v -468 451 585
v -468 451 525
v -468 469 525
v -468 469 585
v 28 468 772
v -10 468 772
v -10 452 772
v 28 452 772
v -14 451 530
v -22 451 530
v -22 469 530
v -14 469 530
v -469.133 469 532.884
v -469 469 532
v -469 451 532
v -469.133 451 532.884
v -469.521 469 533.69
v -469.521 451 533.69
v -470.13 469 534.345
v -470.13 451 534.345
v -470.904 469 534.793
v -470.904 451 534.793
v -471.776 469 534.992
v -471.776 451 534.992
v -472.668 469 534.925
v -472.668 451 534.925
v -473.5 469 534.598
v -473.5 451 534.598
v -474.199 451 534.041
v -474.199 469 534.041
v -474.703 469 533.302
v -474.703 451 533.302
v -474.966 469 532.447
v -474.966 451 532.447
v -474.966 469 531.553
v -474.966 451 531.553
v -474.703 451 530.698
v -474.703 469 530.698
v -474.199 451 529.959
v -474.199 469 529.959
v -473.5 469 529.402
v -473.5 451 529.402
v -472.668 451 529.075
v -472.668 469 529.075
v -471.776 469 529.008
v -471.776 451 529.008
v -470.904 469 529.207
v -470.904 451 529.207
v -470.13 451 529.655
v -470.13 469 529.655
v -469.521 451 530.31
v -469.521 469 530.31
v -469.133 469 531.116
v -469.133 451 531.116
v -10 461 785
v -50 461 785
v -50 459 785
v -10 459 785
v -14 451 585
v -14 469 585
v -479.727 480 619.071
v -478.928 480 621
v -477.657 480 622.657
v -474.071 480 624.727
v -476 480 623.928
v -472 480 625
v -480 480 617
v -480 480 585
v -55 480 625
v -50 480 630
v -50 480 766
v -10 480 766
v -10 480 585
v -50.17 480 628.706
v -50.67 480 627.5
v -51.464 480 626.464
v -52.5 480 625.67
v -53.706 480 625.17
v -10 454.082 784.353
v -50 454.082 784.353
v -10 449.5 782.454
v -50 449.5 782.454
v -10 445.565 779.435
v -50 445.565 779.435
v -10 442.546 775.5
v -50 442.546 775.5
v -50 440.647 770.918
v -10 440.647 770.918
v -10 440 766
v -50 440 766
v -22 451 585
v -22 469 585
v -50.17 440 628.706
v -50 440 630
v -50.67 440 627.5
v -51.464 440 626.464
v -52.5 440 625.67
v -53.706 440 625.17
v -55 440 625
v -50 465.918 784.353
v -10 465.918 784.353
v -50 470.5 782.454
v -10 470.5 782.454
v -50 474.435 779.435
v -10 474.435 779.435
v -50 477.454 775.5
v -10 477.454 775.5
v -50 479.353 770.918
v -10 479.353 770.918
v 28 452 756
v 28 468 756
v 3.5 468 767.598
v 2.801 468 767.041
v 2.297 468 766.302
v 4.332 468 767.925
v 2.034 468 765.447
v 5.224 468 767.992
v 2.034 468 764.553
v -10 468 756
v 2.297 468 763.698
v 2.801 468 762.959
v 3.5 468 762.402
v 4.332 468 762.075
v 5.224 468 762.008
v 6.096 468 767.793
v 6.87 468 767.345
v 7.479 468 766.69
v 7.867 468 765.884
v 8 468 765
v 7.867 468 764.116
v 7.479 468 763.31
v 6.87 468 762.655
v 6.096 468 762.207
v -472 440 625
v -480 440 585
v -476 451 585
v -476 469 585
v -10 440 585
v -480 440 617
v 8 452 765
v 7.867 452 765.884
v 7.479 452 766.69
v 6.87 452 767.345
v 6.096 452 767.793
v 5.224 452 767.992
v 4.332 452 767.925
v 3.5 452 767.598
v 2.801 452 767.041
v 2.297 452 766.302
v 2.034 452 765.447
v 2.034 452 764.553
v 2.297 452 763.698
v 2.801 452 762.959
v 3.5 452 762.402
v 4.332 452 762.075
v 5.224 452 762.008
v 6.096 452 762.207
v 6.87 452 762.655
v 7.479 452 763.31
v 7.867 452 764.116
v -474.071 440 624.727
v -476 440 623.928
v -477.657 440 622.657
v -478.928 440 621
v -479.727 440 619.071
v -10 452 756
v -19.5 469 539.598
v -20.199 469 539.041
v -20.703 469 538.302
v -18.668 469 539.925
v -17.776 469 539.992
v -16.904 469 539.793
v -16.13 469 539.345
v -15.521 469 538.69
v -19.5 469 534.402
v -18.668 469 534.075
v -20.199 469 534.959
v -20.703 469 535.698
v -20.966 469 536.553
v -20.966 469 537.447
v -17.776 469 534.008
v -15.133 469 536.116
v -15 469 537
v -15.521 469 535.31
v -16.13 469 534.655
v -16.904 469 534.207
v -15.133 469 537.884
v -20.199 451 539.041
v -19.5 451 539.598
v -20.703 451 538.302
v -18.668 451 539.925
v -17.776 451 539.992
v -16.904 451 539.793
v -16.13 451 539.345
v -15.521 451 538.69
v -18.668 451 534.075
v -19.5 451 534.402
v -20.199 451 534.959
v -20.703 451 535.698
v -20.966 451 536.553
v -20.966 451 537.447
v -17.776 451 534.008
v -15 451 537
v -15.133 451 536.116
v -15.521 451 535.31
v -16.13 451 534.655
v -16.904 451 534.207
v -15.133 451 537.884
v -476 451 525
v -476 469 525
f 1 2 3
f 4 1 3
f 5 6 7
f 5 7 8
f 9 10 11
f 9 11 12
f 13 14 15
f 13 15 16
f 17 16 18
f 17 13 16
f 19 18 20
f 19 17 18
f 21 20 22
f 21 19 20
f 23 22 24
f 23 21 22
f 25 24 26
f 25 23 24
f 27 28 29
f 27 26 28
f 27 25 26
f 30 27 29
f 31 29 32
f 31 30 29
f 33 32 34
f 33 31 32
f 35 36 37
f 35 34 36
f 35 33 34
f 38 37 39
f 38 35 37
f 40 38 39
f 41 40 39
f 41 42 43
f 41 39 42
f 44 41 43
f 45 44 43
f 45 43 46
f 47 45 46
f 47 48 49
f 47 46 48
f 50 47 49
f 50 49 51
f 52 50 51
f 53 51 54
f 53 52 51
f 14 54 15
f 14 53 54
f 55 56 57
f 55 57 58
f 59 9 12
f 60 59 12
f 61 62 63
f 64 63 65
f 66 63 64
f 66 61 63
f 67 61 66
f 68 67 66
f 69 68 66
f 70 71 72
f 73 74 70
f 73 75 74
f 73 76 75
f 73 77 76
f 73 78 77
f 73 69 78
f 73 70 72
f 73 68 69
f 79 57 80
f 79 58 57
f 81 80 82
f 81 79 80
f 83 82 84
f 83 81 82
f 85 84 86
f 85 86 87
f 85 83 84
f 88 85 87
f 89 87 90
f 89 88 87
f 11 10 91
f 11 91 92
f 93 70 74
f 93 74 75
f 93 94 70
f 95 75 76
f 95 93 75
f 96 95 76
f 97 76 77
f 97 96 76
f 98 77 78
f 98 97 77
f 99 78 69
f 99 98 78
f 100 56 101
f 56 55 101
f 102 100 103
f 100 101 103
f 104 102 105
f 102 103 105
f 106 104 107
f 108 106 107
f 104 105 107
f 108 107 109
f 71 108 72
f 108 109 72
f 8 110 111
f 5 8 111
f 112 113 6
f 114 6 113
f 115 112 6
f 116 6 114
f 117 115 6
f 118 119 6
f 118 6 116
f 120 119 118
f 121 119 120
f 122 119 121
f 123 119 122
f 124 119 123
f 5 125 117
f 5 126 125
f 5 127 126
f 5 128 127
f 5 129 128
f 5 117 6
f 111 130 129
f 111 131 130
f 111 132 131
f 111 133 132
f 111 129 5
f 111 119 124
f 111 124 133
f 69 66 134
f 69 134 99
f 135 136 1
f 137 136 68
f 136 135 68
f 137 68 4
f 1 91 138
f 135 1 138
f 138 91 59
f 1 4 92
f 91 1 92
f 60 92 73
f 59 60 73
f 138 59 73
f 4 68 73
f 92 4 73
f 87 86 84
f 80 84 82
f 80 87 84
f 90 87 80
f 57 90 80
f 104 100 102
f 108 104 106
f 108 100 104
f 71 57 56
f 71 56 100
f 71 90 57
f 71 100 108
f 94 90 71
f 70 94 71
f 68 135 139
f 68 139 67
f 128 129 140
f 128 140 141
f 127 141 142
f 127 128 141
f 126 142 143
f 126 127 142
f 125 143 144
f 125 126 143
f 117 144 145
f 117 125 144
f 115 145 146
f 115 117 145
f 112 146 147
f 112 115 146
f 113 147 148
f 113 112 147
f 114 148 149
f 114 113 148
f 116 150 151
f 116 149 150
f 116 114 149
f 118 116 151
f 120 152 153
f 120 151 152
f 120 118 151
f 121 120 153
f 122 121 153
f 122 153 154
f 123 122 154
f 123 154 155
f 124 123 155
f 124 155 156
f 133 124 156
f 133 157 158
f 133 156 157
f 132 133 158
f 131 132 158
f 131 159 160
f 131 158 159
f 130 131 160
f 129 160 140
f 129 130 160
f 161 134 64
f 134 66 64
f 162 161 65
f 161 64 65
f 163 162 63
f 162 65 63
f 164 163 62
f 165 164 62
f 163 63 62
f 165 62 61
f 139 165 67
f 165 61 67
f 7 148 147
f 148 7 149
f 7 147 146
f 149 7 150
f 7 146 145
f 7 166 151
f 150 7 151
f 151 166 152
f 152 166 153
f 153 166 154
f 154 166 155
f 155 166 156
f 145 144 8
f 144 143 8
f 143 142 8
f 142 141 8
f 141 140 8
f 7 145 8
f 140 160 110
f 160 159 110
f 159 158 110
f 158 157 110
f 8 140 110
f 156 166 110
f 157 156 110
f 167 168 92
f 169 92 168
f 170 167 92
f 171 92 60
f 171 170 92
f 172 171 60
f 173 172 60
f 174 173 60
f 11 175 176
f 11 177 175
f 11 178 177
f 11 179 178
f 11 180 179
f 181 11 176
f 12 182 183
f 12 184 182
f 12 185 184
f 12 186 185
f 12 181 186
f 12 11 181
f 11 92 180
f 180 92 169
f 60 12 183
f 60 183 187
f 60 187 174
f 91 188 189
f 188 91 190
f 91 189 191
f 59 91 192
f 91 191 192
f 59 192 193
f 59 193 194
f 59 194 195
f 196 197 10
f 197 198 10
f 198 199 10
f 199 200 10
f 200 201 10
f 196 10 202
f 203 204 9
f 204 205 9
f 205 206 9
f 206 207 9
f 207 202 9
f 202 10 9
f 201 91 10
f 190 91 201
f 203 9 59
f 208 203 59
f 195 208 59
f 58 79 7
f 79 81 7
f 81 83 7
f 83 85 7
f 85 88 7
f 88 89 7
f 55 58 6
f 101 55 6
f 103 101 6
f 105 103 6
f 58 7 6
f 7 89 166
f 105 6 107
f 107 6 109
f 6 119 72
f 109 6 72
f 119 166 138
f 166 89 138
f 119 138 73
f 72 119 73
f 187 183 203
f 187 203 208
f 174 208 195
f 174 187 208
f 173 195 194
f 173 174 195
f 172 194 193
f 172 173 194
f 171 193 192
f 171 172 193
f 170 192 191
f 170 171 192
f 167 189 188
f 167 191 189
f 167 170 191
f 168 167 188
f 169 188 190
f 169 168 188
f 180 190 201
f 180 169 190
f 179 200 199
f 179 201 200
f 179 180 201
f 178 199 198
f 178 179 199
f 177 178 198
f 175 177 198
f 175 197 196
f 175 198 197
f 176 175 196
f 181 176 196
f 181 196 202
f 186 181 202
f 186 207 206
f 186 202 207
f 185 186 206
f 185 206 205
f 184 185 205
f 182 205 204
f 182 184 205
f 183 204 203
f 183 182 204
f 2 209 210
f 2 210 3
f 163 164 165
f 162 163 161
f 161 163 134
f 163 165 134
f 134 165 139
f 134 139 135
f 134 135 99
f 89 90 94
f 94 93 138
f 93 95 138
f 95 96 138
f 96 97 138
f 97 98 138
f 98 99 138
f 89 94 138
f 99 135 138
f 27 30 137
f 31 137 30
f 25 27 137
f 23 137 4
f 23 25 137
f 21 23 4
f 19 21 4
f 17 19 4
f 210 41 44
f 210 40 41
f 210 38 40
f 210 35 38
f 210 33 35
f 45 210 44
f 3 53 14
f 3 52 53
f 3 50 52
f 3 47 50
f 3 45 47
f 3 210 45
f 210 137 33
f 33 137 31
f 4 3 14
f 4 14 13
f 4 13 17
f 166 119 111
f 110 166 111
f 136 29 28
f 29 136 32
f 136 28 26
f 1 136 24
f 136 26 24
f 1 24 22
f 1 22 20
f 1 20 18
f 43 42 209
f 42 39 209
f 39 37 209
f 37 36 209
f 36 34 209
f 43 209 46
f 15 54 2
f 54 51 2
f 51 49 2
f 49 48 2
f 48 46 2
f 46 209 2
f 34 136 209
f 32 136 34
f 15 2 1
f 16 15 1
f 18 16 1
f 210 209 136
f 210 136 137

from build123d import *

# Parameters (mm, degrees)
CYLINDER178_R          = 3
CYLINDER178_DEPTH      = 60
CYLINDER178_ROLL_ANGLE = 90
BOX109_W               = 38
BOX109_H               = 16
BOX109_DEPTH           = 16
BOX107_W               = 40
BOX107_H               = 40
BOX107_DEPTH           = 200
CYLINDER180_R          = 3
CYLINDER180_DEPTH      = 60
CYLINDER180_ROLL_ANGLE = 90
BOX110_W               = 8
BOX110_H               = 18
BOX110_DEPTH           = 60
CYLINDER179_R          = 3
CYLINDER179_DEPTH      = 60
CYLINDER179_ROLL_ANGLE = 90
BOX105_W               = 8
BOX105_H               = 18
BOX105_DEPTH           = 60
BOX106_W               = 470
BOX106_H               = 40
BOX106_DEPTH           = 40
FILLET_R               = 19
FILLET001_R            = 5
FILLET002_R            = 8


with BuildPart() as cilindro102:
    # Cylinder178 → Cylinder178 (new body)
    with BuildSketch(Plane.XY):
        Circle(CYLINDER178_R)
    extrude(amount=CYLINDER178_DEPTH)


with BuildPart() as cilindro102_1:
    # Cylinder178 roll: moved
    add(cilindro102.part.rotate(Axis((0, 0, 0), (1, 0, 0)), CYLINDER178_ROLL_ANGLE))


with BuildPart() as cilindro102_2:
    # Cylinder178 placement: moved
    add(cilindro102_1.part.moved(Location((5, 37, 765))))


with BuildPart() as cubo075:
    # Box109 → Box109 (new body)
    with BuildSketch(Plane(origin=(-10, -8, 756), x_dir=(1, 0, 0), z_dir=(0, 0, 1))):
        with Locations((19, 8)):
            Rectangle(BOX109_W, BOX109_H)
    extrude(amount=BOX109_DEPTH)


with BuildPart() as cut001:
    # Box107 → Box107 (new body)
    with BuildSketch(Plane(origin=(-50, -20, 585), x_dir=(1, 0, 0), z_dir=(0, 0, 1))):
        with Locations((20, 20)):
            Rectangle(BOX107_W, BOX107_H)
    extrude(amount=BOX107_DEPTH)

    # Fusion054: union Cubo075
    add(cubo075.part)

    # Cut220: cut Cilindro102
    add(cilindro102_2.part, mode=Mode.SUBTRACT)


with BuildPart() as cilindro104:
    # Cylinder180 → Cylinder180 (new body)
    with BuildSketch(Plane.XY):
        Circle(CYLINDER180_R)
    extrude(amount=CYLINDER180_DEPTH)


with BuildPart() as cilindro104_1:
    # Cylinder180 roll: moved
    add(cilindro104.part.rotate(Axis((0, 0, 0), (1, 0, 0)), CYLINDER180_ROLL_ANGLE))


with BuildPart() as cilindro104_2:
    # Cylinder180 placement: moved
    add(cilindro104_1.part.moved(Location((-18, 30, 532))))


with BuildPart() as saliente001:
    # Box110 → Box110 (new body)
    with BuildSketch(Plane(origin=(-22, -9, 525), x_dir=(1, 0, 0), z_dir=(0, 0, 1))):
        with Locations((4, 9)):
            Rectangle(BOX110_W, BOX110_H)
    extrude(amount=BOX110_DEPTH)

    # Cut222: cut Cilindro104
    add(cilindro104_2.part, mode=Mode.SUBTRACT)


with BuildPart() as saliente001_1:
    # Cut222 placement: moved
    add(saliente001.part.moved(Location((-454, 0, 0))))


with BuildPart() as cilindro103:
    # Cylinder179 → Cylinder179 (new body)
    with BuildSketch(Plane.XY):
        Circle(CYLINDER179_R)
    extrude(amount=CYLINDER179_DEPTH)


with BuildPart() as cilindro103_1:
    # Cylinder179 roll: moved
    add(cilindro103.part.rotate(Axis((0, 0, 0), (1, 0, 0)), CYLINDER179_ROLL_ANGLE))


with BuildPart() as cilindro103_2:
    # Cylinder179 placement: moved
    add(cilindro103_1.part.moved(Location((-18, 30, 532))))


with BuildPart() as cut221:
    # Box105 → Box105 (new body)
    with BuildSketch(Plane(origin=(-22, -9, 525), x_dir=(1, 0, 0), z_dir=(0, 0, 1))):
        with Locations((4, 9)):
            Rectangle(BOX105_W, BOX105_H)
    extrude(amount=BOX105_DEPTH)

    # Cut221: cut Cilindro103
    add(cilindro103_2.part, mode=Mode.SUBTRACT)


with BuildPart() as cut221_1:
    # Cut221 placement: moved
    add(cut221.part.moved(Location((0, 0, 5))))


with BuildPart() as fillet002:
    # Box106 → Box106 (new body)
    with BuildSketch(Plane(origin=(-480, -20, 585), x_dir=(1, 0, 0), z_dir=(0, 0, 1))):
        with Locations((235, 20)):
            Rectangle(BOX106_W, BOX106_H)
    extrude(amount=BOX106_DEPTH)

    # Fusion055: union Saliente001, Cut221
    add(saliente001_1.part)
    add(cut221_1.part)

    # Fusion059: union cut001
    add(cut001.part)


with BuildPart() as fillet002_1:
    # Fusion059 placement: moved
    add(fillet002.part.moved(Location((0, 460, 0))))

    # Fillet
    fillet_edges = [fillet002_1.edges().sort_by_distance(p)[0] for p in [
        (-30, 480, 785),
        (-30, 440, 785),
    ]]
    fillet(fillet_edges, radius=FILLET_R)

    # Fillet001
    fillet001_edges = [fillet002_1.edges().sort_by_distance(p)[0] for p in [
        (-50, 460, 625),
    ]]
    fillet(fillet001_edges, radius=FILLET001_R)

    # Fillet002
    fillet002_edges = [fillet002_1.edges().sort_by_distance(p)[0] for p in [
        (-480, 460, 625),
    ]]
    fillet(fillet002_edges, radius=FILLET002_R)


solid = fillet002_1.part
